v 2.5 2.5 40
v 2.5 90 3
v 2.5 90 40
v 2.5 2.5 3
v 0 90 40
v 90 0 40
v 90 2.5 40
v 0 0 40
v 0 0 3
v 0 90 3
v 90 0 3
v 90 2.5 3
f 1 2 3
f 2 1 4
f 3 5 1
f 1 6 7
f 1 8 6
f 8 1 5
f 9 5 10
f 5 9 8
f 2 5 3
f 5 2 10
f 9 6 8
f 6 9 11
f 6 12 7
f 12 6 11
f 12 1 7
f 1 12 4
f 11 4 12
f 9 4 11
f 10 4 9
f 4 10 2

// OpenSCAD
// Magnetic stirrer housing - an open box (a plate with four walls) that covers a PC case fan
// to turn it into a stir plate. The top plate is the stirring surface. NOVEL general part.
//

top    = 90;
length = 90;
height = 40;
wall   = 2.5;
screw  = 4.5;

$fn = 48;

plate_t = 2;

difference() {
    union() {
        cube([top, length, plate_t]);                                              // top plate
        for (x = [-top / 2 - wall, top / 2 - wall])
            cube([wall, length, height], p = [x, 0, 0]);                           // left walls
        for (y = [-length / 2 - wall, length / 2 - wall])
            cube([top, wall, height], p = [0, y, 0]);                              // right walls
    }
    translate([0, 0, -1]) cube([top, length, plate_t + 2]);                        // clear the top surface
    for (x = [-71.5 / 2, 71.5 / 2], y = [-71.5 / 2, 71.5 / 2])
        translate([x, y, -1]) cylinder(h = plate_t + 2, d = screw);                 // screw holes
    // one cable notch in one wall: 12 mm wide, centred along the wall, 8 mm deep from the open edge
    translate([-top / 2 - wall, 0, height - 8]) cube([wall + 12, length, 8]);
}
